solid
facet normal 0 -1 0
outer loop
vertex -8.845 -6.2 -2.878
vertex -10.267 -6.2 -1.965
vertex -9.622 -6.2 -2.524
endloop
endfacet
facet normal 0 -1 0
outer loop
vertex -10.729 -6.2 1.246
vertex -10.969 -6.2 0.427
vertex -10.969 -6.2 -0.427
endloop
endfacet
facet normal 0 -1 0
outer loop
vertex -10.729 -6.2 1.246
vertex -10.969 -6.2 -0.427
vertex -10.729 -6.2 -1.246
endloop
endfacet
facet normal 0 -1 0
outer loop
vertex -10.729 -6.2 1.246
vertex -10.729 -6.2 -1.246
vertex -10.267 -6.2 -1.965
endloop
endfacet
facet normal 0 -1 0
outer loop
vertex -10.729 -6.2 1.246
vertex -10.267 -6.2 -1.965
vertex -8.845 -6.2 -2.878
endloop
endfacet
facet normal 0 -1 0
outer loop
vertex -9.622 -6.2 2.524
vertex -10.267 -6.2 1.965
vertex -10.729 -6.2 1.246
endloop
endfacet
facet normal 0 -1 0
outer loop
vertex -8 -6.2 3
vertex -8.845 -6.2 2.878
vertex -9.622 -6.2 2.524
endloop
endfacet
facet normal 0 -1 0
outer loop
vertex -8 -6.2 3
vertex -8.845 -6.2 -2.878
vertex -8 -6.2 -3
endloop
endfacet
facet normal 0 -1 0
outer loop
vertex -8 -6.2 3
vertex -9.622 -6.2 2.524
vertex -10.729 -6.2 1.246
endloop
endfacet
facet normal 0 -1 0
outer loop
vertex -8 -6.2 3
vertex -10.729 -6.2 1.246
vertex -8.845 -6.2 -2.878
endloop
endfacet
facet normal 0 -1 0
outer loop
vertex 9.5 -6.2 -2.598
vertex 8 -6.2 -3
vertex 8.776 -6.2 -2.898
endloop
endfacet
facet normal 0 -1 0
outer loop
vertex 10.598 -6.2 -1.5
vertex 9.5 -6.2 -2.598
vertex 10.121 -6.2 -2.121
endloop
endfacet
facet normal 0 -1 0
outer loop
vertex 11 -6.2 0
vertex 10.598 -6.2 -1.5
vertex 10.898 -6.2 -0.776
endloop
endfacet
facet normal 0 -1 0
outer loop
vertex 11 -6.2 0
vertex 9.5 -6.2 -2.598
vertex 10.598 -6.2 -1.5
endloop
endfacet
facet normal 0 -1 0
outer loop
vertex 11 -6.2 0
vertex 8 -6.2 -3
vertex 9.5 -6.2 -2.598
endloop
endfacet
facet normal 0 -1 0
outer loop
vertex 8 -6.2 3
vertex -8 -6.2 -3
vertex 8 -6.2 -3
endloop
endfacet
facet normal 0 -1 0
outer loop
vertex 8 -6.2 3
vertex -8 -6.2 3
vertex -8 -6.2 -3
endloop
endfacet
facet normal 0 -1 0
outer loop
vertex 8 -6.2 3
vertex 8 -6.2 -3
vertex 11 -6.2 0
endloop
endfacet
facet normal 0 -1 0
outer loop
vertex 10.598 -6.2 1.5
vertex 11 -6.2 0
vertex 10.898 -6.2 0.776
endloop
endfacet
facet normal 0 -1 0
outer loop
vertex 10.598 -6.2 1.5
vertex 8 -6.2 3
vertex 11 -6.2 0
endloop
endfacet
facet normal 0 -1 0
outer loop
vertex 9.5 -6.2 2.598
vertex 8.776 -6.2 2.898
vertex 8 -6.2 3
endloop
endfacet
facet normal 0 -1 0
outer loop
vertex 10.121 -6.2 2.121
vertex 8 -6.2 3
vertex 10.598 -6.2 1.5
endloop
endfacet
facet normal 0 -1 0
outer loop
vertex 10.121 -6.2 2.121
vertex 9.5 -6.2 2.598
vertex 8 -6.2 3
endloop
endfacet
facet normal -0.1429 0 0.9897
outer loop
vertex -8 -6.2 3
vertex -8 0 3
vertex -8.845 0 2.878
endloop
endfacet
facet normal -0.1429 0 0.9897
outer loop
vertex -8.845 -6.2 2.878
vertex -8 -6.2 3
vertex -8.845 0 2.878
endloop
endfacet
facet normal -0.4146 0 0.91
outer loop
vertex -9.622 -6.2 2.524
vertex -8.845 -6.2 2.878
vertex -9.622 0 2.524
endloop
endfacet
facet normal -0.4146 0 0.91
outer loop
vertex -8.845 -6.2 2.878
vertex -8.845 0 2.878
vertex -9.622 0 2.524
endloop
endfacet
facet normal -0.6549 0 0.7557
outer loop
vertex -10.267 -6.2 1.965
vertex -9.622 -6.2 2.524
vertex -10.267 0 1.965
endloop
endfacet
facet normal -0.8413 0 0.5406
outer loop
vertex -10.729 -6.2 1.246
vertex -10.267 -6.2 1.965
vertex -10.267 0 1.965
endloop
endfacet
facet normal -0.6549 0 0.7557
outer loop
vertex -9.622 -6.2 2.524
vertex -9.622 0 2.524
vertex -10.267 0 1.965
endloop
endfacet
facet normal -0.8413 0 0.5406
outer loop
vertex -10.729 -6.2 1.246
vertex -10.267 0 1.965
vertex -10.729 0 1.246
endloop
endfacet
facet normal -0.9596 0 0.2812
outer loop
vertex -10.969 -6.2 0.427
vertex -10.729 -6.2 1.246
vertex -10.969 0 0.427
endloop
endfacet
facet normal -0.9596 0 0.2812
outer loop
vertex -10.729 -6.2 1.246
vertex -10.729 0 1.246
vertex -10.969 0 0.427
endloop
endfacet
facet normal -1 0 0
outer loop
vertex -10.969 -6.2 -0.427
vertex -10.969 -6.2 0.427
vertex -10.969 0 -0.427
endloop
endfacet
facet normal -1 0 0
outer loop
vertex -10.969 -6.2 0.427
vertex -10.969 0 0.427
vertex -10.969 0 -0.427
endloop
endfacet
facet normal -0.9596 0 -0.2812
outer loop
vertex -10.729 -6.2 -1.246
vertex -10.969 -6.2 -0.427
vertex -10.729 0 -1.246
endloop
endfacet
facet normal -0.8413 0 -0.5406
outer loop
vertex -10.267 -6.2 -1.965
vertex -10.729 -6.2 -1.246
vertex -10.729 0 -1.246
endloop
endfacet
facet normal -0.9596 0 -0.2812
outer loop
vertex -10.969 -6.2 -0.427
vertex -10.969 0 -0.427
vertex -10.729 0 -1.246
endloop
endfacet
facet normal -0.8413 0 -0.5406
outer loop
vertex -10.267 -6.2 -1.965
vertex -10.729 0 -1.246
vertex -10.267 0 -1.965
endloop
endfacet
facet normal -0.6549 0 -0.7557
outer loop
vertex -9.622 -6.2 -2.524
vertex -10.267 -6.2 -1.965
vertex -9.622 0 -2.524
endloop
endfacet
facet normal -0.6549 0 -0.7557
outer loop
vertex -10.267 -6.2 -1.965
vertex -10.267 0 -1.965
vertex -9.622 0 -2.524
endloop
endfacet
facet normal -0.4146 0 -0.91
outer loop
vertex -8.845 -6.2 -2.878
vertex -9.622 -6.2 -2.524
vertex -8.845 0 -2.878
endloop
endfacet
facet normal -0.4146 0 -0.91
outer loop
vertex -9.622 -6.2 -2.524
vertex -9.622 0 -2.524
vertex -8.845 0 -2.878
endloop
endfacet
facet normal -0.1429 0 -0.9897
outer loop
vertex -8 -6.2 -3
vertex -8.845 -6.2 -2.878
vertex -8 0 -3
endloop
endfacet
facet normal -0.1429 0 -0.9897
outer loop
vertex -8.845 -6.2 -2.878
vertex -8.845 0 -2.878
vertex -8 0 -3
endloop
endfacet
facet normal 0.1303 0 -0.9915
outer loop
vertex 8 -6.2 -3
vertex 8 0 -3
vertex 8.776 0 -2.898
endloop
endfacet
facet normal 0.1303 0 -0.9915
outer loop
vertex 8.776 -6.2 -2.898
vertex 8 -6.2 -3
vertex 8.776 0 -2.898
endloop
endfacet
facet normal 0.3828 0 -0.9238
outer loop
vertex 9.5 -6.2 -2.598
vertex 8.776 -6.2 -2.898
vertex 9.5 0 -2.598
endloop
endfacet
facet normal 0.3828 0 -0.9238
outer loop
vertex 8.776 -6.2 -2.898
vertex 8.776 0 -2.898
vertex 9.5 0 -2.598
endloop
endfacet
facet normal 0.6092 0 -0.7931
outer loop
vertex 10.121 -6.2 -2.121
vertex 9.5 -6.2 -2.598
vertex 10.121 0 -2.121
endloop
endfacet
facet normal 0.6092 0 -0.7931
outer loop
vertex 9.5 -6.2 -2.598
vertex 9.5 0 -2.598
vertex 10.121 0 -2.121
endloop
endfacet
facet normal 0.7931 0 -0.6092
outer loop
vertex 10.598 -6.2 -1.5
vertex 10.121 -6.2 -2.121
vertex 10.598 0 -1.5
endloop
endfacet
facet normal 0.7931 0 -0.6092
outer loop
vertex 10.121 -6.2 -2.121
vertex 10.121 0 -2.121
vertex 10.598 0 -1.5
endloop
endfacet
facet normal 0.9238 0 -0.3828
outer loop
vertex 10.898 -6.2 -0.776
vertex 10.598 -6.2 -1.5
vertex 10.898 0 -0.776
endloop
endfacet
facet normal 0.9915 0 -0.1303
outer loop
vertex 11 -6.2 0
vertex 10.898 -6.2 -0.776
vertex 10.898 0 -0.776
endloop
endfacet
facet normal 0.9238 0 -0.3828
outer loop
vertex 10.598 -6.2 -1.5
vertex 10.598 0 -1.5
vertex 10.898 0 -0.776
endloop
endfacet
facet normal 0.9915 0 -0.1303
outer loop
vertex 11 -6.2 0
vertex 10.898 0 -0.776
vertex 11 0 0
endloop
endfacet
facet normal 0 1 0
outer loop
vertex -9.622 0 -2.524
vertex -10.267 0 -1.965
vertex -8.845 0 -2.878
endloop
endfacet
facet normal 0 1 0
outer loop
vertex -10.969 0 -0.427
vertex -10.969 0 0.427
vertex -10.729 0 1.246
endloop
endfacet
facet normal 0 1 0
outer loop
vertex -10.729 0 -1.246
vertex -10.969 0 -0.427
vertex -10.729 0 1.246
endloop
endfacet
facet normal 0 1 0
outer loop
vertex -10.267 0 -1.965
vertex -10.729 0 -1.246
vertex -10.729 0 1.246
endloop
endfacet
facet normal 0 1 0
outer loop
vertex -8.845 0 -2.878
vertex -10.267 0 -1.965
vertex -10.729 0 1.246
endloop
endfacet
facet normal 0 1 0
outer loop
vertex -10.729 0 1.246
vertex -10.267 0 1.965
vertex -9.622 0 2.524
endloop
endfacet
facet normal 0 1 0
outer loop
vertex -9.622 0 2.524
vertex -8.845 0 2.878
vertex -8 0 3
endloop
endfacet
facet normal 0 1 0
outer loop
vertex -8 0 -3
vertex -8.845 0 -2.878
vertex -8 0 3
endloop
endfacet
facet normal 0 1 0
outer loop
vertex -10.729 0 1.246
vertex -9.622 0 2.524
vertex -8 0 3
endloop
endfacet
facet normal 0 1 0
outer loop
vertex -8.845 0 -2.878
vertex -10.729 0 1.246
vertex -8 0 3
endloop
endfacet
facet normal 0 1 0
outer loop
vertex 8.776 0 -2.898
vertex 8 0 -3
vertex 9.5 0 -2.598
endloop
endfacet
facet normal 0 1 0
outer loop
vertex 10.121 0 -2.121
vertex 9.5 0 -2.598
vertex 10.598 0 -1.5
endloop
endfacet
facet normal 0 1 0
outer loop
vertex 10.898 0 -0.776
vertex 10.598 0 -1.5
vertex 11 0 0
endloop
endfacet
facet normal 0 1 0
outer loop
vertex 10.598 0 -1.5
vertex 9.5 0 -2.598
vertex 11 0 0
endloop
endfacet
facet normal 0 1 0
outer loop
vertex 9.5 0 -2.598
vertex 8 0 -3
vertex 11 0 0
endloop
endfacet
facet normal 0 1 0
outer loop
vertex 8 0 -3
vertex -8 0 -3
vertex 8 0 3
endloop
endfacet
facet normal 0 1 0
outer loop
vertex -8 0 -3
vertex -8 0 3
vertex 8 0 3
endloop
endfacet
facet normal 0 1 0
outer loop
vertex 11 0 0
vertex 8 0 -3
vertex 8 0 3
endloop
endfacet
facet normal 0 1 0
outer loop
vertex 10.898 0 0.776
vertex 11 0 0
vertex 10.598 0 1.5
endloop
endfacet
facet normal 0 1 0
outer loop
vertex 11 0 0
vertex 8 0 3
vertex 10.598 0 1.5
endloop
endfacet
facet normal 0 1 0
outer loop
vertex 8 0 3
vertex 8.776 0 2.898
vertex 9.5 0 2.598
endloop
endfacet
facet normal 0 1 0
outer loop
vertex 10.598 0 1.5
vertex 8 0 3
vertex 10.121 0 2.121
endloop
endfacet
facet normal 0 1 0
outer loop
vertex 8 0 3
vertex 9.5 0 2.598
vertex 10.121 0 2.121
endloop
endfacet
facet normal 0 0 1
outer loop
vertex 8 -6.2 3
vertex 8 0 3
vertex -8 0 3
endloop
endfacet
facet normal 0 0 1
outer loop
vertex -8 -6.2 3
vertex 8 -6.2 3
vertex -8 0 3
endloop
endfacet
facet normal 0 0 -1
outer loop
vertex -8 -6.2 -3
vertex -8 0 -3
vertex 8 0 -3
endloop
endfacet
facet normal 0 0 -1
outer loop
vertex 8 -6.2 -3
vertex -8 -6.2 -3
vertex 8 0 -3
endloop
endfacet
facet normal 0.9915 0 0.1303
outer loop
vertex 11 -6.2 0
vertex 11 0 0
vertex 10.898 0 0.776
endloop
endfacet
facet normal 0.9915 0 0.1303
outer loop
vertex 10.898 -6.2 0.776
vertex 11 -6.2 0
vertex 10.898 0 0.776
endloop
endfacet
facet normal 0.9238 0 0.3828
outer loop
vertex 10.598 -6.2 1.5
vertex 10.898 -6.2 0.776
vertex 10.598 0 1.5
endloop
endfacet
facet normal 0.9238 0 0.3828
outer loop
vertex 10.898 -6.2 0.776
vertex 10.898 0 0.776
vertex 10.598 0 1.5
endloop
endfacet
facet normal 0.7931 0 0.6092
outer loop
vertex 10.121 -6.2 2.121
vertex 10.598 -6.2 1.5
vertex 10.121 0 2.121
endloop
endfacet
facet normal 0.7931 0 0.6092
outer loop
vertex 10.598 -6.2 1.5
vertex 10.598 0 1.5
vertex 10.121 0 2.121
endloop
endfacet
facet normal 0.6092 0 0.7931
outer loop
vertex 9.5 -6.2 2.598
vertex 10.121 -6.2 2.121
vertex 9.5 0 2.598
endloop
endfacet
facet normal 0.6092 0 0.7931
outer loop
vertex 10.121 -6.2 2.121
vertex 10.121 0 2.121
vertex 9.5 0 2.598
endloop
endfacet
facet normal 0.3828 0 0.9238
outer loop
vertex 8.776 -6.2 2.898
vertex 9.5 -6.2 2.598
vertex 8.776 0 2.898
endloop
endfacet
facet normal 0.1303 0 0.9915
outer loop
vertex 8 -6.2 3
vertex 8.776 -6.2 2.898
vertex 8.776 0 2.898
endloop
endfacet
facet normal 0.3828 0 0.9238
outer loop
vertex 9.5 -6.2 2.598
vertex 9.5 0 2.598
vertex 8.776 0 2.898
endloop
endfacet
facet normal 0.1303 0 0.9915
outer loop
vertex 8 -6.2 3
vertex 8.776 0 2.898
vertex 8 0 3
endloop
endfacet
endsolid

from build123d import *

# Parameters (mm, degrees)
F1_DEPTH = 6.2


with BuildPart() as f1:
    # F0 (on Front) → F1 (new body)
    with BuildSketch(Plane.XZ):
        with BuildLine():
            ThreePointArc((-8, 3), (-11, 0), (-8, -3))
            ThreePointArc((-8, -3), (-5.8786796564, -2.1213203436), (-5, 0))
            ThreePointArc((-5, 0), (-5.8786796564, 2.1213203436), (-8, 3))
        make_face()
        with BuildLine():
            Line((-8, -3), (8, -3))
            ThreePointArc((8, -3), (5, 0), (8, 3))
            Line((8, 3), (-8, 3))
            ThreePointArc((-8, 3), (-5.8786796564, 2.1213203436), (-5, 0))
            ThreePointArc((-5, 0), (-5.8786796564, -2.1213203436), (-8, -3))
        make_face()
        with BuildLine():
            ThreePointArc((8, 3), (5, 0), (8, -3))
            ThreePointArc((8, -3), (10.1213203436, -2.1213203436), (11, 0))
            ThreePointArc((11, 0), (10.1213203436, 2.1213203436), (8, 3))
        make_face()
    extrude(amount=F1_DEPTH)


solid = f1.part
